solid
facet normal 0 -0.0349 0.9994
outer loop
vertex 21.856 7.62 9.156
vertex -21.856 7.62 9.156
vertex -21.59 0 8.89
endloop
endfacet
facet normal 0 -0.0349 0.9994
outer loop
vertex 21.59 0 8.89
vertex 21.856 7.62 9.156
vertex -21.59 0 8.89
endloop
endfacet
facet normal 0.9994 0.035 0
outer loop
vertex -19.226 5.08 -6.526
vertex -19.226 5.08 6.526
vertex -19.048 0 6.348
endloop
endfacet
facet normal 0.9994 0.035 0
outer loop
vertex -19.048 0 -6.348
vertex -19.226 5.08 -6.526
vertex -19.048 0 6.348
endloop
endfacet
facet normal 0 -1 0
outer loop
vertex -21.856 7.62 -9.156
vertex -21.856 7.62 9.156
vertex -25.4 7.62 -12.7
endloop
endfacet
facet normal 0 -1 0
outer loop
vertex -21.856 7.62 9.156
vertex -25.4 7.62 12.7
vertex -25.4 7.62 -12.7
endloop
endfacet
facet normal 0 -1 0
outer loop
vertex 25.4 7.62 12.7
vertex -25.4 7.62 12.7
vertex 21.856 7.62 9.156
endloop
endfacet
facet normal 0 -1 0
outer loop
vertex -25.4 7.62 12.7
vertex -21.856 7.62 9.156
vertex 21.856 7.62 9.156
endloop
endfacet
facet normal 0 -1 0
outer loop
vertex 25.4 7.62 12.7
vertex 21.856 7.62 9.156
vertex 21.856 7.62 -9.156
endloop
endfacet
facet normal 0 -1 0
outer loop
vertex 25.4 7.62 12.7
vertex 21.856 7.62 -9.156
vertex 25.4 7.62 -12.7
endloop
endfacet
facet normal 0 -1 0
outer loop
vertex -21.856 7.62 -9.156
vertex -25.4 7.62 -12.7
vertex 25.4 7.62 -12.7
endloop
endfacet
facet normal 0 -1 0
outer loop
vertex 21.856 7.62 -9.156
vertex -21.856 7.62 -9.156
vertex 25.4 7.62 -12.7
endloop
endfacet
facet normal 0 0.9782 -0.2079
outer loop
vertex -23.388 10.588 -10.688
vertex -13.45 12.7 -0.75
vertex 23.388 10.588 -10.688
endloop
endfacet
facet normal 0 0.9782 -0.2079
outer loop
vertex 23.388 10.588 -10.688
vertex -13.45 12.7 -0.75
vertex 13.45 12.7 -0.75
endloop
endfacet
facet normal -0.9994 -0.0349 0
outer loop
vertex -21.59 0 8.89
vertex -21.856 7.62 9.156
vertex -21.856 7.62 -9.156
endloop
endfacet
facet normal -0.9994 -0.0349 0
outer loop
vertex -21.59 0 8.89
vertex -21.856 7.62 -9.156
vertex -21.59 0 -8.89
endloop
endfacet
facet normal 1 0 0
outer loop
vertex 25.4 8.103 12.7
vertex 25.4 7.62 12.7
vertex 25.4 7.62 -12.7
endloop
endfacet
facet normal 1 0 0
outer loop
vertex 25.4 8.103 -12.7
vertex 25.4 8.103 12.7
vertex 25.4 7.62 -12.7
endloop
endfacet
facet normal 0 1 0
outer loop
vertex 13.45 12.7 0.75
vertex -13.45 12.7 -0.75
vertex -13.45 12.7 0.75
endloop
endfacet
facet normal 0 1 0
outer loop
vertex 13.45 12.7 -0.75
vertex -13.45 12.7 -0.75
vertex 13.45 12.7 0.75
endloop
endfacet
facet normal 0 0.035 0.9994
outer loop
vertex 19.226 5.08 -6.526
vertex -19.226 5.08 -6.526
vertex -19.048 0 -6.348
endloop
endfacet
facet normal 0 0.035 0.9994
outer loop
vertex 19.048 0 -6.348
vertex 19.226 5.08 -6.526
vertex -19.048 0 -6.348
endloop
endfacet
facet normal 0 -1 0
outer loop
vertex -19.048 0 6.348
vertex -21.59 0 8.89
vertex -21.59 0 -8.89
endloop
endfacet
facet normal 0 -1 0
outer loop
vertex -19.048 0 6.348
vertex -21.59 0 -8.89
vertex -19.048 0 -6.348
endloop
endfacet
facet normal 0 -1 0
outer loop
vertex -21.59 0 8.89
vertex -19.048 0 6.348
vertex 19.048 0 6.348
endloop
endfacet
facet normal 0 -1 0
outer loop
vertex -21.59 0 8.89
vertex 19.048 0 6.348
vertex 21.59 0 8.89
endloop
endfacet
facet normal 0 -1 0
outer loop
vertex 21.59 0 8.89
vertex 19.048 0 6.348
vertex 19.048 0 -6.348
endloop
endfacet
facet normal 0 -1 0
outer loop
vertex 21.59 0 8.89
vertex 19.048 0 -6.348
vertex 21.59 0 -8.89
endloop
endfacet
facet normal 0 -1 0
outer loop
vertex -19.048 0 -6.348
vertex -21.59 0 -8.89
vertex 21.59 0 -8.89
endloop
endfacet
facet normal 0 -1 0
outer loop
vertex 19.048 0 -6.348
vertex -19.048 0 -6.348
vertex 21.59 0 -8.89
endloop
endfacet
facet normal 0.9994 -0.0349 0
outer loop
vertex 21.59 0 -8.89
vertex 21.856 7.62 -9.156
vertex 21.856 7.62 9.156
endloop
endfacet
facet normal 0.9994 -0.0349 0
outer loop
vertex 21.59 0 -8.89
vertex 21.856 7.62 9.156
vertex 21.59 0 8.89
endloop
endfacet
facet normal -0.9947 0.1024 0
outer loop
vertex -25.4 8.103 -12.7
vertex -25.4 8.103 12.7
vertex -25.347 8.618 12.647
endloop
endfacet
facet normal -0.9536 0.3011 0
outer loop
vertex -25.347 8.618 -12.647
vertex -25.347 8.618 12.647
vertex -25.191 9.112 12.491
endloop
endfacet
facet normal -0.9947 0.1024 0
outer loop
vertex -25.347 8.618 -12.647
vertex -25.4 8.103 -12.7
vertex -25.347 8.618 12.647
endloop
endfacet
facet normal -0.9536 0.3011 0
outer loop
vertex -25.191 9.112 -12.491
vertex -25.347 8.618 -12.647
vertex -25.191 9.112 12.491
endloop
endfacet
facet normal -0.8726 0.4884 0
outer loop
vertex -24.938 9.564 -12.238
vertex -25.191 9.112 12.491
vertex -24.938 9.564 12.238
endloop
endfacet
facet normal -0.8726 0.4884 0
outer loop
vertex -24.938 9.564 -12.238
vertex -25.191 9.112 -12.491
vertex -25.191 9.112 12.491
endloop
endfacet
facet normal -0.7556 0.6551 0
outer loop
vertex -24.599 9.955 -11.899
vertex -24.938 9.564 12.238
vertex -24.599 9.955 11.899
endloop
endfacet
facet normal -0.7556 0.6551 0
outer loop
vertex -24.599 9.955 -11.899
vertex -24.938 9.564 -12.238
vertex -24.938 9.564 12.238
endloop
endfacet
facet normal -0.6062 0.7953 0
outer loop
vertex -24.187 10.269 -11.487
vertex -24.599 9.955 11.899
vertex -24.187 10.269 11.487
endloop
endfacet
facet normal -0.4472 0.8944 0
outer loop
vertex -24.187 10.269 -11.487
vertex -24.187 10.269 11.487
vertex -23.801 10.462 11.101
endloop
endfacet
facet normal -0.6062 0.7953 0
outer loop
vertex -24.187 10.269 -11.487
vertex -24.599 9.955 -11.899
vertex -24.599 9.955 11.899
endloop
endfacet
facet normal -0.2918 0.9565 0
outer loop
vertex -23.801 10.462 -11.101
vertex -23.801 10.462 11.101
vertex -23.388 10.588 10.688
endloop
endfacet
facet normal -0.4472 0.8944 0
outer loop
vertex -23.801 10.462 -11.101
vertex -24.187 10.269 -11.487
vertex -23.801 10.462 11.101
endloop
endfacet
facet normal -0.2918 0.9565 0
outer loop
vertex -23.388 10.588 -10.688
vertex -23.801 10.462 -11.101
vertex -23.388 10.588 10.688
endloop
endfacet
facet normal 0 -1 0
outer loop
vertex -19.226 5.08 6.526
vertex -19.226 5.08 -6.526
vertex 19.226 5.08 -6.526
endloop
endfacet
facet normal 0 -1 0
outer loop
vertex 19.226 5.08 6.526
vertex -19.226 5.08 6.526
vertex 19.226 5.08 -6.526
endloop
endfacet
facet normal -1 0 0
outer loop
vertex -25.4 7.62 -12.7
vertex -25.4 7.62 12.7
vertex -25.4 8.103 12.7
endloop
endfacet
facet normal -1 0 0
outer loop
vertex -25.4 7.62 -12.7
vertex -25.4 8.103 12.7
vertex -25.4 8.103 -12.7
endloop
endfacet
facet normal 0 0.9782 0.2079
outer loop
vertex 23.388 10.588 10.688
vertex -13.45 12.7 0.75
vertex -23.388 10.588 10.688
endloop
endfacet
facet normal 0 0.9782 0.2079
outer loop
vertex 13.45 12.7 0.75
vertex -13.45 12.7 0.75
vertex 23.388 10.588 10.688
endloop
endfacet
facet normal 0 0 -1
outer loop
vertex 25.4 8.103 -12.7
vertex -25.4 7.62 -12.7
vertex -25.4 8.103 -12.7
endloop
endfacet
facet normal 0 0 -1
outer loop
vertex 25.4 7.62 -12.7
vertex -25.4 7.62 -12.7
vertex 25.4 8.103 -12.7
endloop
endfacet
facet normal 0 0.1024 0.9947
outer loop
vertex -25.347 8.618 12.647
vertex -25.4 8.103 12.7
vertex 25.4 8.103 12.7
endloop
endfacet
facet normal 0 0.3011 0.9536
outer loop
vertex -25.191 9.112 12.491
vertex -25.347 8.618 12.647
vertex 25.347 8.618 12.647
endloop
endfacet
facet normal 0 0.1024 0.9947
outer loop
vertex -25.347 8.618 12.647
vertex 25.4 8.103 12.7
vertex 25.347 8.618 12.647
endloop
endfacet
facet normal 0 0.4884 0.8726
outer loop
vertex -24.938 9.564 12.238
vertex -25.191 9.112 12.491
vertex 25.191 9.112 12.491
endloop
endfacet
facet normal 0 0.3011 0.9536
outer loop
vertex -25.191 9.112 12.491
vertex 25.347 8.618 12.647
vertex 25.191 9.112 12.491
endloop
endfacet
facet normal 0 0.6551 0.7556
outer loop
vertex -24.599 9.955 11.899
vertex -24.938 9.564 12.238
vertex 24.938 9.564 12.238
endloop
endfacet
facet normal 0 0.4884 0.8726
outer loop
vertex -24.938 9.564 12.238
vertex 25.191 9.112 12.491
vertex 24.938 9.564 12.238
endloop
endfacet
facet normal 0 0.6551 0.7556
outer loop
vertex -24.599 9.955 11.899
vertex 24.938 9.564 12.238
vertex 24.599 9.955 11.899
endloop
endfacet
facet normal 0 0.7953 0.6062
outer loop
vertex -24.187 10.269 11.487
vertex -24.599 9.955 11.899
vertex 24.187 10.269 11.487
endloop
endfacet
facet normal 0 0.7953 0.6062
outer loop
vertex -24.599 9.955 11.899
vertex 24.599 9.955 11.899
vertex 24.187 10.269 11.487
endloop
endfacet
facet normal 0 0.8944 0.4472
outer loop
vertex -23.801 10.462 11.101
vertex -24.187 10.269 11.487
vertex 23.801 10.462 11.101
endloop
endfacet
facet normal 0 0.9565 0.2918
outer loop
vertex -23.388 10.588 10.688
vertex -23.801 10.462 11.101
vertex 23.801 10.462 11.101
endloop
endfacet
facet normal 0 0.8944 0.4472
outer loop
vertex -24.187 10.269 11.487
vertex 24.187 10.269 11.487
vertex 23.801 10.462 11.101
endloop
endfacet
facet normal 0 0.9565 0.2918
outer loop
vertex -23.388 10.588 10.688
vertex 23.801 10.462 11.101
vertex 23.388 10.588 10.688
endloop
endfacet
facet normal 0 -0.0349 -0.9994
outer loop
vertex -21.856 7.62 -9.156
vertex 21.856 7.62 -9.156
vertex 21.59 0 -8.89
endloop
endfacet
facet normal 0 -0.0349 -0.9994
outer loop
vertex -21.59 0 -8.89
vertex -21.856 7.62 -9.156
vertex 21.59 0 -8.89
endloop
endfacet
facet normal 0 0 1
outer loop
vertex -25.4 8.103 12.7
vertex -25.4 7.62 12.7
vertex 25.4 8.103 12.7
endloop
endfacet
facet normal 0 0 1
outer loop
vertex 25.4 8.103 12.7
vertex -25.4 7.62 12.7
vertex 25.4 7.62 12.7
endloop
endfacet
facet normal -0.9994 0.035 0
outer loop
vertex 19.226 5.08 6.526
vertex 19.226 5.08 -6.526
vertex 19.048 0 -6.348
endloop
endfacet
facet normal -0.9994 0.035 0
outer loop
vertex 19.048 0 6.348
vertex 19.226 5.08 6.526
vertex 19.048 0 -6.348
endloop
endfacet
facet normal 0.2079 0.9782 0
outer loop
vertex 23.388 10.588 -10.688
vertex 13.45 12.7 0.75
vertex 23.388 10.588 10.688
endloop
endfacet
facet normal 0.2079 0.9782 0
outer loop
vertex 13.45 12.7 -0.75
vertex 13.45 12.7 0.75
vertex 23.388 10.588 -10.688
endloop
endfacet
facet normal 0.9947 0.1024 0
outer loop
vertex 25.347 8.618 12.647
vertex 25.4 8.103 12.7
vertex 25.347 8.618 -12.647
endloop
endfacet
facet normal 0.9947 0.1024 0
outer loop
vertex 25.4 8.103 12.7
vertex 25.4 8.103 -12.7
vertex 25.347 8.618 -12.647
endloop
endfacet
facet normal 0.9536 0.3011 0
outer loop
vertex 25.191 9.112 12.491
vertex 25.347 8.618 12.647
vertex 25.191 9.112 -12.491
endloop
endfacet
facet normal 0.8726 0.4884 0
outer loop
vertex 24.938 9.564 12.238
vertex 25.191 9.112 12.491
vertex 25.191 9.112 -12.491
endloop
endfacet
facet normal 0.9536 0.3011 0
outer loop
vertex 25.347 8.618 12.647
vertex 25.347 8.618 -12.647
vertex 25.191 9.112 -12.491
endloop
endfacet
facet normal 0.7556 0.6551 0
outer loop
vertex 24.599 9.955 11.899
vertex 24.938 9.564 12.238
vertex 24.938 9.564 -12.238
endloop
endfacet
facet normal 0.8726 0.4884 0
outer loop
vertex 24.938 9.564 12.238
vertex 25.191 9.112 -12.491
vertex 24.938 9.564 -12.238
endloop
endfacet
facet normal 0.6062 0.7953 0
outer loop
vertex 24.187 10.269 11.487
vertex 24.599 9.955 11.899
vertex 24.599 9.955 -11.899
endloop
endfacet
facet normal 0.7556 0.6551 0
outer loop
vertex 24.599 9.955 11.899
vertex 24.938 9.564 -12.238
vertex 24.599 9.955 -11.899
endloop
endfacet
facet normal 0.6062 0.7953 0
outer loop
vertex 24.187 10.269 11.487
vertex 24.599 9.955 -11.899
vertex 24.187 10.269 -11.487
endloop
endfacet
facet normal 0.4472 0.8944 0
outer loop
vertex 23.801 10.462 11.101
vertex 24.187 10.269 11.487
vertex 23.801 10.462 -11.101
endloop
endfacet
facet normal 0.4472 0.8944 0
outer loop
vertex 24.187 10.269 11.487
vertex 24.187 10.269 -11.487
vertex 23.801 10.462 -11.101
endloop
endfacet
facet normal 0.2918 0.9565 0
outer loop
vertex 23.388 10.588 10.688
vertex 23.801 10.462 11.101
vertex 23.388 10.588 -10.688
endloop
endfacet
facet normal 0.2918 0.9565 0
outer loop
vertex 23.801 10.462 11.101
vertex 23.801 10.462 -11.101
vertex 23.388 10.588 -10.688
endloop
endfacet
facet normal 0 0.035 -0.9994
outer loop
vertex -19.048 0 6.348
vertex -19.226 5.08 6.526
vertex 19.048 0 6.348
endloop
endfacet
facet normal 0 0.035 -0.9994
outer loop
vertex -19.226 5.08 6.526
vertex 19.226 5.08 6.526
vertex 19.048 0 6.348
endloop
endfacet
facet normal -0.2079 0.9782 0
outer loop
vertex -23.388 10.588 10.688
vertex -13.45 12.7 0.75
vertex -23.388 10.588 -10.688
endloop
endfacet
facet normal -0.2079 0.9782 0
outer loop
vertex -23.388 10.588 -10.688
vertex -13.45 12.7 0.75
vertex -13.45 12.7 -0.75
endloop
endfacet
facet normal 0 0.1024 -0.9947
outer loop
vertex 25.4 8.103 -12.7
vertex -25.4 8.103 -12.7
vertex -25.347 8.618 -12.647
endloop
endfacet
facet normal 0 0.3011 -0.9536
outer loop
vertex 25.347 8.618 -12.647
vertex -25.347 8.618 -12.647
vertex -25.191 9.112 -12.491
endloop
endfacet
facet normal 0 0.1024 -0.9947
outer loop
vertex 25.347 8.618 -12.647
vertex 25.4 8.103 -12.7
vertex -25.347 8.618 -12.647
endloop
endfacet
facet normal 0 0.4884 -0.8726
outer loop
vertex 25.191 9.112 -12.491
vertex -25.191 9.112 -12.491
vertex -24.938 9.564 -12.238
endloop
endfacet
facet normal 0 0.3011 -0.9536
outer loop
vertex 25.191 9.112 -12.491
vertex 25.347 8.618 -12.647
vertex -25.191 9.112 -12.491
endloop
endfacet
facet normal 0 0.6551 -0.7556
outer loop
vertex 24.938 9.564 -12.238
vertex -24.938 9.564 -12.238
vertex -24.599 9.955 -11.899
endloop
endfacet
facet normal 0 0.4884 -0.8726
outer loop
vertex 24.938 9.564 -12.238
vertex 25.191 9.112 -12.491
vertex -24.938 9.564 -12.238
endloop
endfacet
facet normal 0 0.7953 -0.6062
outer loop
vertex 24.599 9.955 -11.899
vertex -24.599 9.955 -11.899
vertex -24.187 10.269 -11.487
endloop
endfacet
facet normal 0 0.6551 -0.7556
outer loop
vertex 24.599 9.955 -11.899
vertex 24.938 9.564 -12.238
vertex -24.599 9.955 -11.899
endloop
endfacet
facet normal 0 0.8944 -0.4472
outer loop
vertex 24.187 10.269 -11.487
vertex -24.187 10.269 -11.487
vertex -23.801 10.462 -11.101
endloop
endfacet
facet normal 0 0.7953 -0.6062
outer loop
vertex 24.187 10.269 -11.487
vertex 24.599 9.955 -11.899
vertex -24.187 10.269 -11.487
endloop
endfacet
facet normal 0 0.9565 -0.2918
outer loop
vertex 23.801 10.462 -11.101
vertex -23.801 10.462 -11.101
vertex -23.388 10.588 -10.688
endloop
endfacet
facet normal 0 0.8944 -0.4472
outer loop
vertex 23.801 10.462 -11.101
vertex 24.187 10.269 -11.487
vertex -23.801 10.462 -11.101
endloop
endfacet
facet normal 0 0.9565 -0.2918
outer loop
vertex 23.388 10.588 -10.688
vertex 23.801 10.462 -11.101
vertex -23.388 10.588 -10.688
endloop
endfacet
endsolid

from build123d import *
from OCP.BRepFilletAPI import BRepFilletAPI_MakeChamfer

# Parameters (mm, degrees)
SKETCH1_W           = 43.942
SKETCH1_H           = 18.542
BOSS_EXTRUDE1_DEPTH = 7.62
CHAMFER1_SIZE       = 10.910412501
CHAMFER1_SIZE_2     = 0.381
SHELL1_T            = -2.54
SKETCH2_W           = 50.8
SKETCH2_H           = 25.4
BOSS_EXTRUDE2_DEPTH = 5.08
CHAMFER2_SIZE       = 2.54
CHAMFER2_SIZE2      = 11.949760478
FILLET1_R           = 2.54


with BuildPart() as part:
    # Sketch1 → Boss-Extrude1 (new body)
    with BuildSketch(Plane(origin=(0, 0, 0), x_dir=(1, 0, 0), z_dir=(0, 1, 0))):
        Rectangle(SKETCH1_W, SKETCH1_H)
    extrude(amount=BOSS_EXTRUDE1_DEPTH)

    # Chamfer1
    # the kernel refuses this chamfer: 10.910412501, 0.381 mm, written as the material it takes off along each edge
    with BuildSketch(Plane(origin=(-21.971, 0, 37.637433425), x_dir=(-0.0013423185755923317, 0.999999099090015, 0), z_dir=(0, 0, -1)), Plane(origin=(21.971, 0, -37.637433425), x_dir=(0.0013423185755923317, 0.999999099090015, 0), z_dir=(0, 0, 1))) as chamfer1_piece_1:
        Polygon((CHAMFER1_SIZE * 0.999999099071, CHAMFER1_SIZE * 0.00134231857557), (-CHAMFER1_SIZE_2 * 0.00134231857559, CHAMFER1_SIZE_2 * 0.99999909909), (0, 0), align=None)
    extrude(amount=75.27486685, mode=Mode.SUBTRACT)
    with BuildSketch(Plane(origin=(-50.337433425, 0, -9.271), x_dir=(0, 0.999999099090015, -0.0013423185755923317), z_dir=(1, 0, 0)), Plane(origin=(50.337433425, 0, 9.271), x_dir=(0, 0.999999099090015, 0.0013423185755923317), z_dir=(-1, 0, 0))) as chamfer1_piece_2:
        Polygon((CHAMFER1_SIZE * 0.999999099071, CHAMFER1_SIZE * 0.00134231857557), (-CHAMFER1_SIZE_2 * 0.00134231857559, CHAMFER1_SIZE_2 * 0.99999909909), (0, 0), align=None)
    extrude(amount=100.67486685, mode=Mode.SUBTRACT)

    # Shell1
    shell1_openings = [part.faces().sort_by_distance(p)[0] for p in [
        (0, 0, 0),
    ]]
    offset(amount=SHELL1_T, openings=shell1_openings, kind=Kind.INTERSECTION)

    # Sketch2 → Boss-Extrude2 (add)
    with BuildSketch(Plane(origin=(0, 7.62, 0), x_dir=(1, 0, 0), z_dir=(0, 1, 0))):
        Rectangle(SKETCH2_W, SKETCH2_H)
    extrude(amount=BOSS_EXTRUDE2_DEPTH)

    # Chamfer2: one chamfer whose edges measure the first distance from different faces: ONE call of the kernel's chamfer builder (chamfer() names one face for all edges)
    chamfer2_edges_1 = [part.edges().sort_by_distance(p)[0] for p in [
        (-25.4, 12.7, 0),
    ]]
    chamfer2_side_1 = [part.faces().sort_by_distance(p)[0] for p in [
        (-25.4, 10.16, 0),
    ]]
    chamfer2_edges_2 = [part.edges().sort_by_distance(p)[0] for p in [
        (0, 12.7, 12.7),
    ]]
    chamfer2_side_2 = [part.faces().sort_by_distance(p)[0] for p in [
        (0, 10.16, 12.7),
    ]]
    chamfer2_edges_3 = [part.edges().sort_by_distance(p)[0] for p in [
        (25.4, 12.7, 0),
    ]]
    chamfer2_side_3 = [part.faces().sort_by_distance(p)[0] for p in [
        (25.4, 10.16, 0),
    ]]
    chamfer2_edges_4 = [part.edges().sort_by_distance(p)[0] for p in [
        (0, 12.7, -12.7),
    ]]
    chamfer2_side_4 = [part.faces().sort_by_distance(p)[0] for p in [
        (0, 10.16, -12.7),
    ]]
    chamfer2 = BRepFilletAPI_MakeChamfer(part.part.solid().wrapped)
    for e in chamfer2_edges_1:
        chamfer2.Add(CHAMFER2_SIZE, CHAMFER2_SIZE2, e.wrapped, chamfer2_side_1[0].wrapped)  # the first distance lies on this face
    for e in chamfer2_edges_2:
        chamfer2.Add(CHAMFER2_SIZE, CHAMFER2_SIZE2, e.wrapped, chamfer2_side_2[0].wrapped)  # the first distance lies on this face
    for e in chamfer2_edges_3:
        chamfer2.Add(CHAMFER2_SIZE, CHAMFER2_SIZE2, e.wrapped, chamfer2_side_3[0].wrapped)  # the first distance lies on this face
    for e in chamfer2_edges_4:
        chamfer2.Add(CHAMFER2_SIZE, CHAMFER2_SIZE2, e.wrapped, chamfer2_side_4[0].wrapped)  # the first distance lies on this face
    add(Compound.cast(chamfer2.Shape()), mode=Mode.REPLACE)

    # Fillet1
    fillet1_edges = [part.edges().sort_by_distance(p)[0] for p in [
        (0, 10.16, 12.7),
        (-25.4, 10.16, 0),
        (0, 10.16, -12.7),
        (25.4, 10.16, 0),
    ]]
    fillet(fillet1_edges, radius=FILLET1_R)


solid = part.part
